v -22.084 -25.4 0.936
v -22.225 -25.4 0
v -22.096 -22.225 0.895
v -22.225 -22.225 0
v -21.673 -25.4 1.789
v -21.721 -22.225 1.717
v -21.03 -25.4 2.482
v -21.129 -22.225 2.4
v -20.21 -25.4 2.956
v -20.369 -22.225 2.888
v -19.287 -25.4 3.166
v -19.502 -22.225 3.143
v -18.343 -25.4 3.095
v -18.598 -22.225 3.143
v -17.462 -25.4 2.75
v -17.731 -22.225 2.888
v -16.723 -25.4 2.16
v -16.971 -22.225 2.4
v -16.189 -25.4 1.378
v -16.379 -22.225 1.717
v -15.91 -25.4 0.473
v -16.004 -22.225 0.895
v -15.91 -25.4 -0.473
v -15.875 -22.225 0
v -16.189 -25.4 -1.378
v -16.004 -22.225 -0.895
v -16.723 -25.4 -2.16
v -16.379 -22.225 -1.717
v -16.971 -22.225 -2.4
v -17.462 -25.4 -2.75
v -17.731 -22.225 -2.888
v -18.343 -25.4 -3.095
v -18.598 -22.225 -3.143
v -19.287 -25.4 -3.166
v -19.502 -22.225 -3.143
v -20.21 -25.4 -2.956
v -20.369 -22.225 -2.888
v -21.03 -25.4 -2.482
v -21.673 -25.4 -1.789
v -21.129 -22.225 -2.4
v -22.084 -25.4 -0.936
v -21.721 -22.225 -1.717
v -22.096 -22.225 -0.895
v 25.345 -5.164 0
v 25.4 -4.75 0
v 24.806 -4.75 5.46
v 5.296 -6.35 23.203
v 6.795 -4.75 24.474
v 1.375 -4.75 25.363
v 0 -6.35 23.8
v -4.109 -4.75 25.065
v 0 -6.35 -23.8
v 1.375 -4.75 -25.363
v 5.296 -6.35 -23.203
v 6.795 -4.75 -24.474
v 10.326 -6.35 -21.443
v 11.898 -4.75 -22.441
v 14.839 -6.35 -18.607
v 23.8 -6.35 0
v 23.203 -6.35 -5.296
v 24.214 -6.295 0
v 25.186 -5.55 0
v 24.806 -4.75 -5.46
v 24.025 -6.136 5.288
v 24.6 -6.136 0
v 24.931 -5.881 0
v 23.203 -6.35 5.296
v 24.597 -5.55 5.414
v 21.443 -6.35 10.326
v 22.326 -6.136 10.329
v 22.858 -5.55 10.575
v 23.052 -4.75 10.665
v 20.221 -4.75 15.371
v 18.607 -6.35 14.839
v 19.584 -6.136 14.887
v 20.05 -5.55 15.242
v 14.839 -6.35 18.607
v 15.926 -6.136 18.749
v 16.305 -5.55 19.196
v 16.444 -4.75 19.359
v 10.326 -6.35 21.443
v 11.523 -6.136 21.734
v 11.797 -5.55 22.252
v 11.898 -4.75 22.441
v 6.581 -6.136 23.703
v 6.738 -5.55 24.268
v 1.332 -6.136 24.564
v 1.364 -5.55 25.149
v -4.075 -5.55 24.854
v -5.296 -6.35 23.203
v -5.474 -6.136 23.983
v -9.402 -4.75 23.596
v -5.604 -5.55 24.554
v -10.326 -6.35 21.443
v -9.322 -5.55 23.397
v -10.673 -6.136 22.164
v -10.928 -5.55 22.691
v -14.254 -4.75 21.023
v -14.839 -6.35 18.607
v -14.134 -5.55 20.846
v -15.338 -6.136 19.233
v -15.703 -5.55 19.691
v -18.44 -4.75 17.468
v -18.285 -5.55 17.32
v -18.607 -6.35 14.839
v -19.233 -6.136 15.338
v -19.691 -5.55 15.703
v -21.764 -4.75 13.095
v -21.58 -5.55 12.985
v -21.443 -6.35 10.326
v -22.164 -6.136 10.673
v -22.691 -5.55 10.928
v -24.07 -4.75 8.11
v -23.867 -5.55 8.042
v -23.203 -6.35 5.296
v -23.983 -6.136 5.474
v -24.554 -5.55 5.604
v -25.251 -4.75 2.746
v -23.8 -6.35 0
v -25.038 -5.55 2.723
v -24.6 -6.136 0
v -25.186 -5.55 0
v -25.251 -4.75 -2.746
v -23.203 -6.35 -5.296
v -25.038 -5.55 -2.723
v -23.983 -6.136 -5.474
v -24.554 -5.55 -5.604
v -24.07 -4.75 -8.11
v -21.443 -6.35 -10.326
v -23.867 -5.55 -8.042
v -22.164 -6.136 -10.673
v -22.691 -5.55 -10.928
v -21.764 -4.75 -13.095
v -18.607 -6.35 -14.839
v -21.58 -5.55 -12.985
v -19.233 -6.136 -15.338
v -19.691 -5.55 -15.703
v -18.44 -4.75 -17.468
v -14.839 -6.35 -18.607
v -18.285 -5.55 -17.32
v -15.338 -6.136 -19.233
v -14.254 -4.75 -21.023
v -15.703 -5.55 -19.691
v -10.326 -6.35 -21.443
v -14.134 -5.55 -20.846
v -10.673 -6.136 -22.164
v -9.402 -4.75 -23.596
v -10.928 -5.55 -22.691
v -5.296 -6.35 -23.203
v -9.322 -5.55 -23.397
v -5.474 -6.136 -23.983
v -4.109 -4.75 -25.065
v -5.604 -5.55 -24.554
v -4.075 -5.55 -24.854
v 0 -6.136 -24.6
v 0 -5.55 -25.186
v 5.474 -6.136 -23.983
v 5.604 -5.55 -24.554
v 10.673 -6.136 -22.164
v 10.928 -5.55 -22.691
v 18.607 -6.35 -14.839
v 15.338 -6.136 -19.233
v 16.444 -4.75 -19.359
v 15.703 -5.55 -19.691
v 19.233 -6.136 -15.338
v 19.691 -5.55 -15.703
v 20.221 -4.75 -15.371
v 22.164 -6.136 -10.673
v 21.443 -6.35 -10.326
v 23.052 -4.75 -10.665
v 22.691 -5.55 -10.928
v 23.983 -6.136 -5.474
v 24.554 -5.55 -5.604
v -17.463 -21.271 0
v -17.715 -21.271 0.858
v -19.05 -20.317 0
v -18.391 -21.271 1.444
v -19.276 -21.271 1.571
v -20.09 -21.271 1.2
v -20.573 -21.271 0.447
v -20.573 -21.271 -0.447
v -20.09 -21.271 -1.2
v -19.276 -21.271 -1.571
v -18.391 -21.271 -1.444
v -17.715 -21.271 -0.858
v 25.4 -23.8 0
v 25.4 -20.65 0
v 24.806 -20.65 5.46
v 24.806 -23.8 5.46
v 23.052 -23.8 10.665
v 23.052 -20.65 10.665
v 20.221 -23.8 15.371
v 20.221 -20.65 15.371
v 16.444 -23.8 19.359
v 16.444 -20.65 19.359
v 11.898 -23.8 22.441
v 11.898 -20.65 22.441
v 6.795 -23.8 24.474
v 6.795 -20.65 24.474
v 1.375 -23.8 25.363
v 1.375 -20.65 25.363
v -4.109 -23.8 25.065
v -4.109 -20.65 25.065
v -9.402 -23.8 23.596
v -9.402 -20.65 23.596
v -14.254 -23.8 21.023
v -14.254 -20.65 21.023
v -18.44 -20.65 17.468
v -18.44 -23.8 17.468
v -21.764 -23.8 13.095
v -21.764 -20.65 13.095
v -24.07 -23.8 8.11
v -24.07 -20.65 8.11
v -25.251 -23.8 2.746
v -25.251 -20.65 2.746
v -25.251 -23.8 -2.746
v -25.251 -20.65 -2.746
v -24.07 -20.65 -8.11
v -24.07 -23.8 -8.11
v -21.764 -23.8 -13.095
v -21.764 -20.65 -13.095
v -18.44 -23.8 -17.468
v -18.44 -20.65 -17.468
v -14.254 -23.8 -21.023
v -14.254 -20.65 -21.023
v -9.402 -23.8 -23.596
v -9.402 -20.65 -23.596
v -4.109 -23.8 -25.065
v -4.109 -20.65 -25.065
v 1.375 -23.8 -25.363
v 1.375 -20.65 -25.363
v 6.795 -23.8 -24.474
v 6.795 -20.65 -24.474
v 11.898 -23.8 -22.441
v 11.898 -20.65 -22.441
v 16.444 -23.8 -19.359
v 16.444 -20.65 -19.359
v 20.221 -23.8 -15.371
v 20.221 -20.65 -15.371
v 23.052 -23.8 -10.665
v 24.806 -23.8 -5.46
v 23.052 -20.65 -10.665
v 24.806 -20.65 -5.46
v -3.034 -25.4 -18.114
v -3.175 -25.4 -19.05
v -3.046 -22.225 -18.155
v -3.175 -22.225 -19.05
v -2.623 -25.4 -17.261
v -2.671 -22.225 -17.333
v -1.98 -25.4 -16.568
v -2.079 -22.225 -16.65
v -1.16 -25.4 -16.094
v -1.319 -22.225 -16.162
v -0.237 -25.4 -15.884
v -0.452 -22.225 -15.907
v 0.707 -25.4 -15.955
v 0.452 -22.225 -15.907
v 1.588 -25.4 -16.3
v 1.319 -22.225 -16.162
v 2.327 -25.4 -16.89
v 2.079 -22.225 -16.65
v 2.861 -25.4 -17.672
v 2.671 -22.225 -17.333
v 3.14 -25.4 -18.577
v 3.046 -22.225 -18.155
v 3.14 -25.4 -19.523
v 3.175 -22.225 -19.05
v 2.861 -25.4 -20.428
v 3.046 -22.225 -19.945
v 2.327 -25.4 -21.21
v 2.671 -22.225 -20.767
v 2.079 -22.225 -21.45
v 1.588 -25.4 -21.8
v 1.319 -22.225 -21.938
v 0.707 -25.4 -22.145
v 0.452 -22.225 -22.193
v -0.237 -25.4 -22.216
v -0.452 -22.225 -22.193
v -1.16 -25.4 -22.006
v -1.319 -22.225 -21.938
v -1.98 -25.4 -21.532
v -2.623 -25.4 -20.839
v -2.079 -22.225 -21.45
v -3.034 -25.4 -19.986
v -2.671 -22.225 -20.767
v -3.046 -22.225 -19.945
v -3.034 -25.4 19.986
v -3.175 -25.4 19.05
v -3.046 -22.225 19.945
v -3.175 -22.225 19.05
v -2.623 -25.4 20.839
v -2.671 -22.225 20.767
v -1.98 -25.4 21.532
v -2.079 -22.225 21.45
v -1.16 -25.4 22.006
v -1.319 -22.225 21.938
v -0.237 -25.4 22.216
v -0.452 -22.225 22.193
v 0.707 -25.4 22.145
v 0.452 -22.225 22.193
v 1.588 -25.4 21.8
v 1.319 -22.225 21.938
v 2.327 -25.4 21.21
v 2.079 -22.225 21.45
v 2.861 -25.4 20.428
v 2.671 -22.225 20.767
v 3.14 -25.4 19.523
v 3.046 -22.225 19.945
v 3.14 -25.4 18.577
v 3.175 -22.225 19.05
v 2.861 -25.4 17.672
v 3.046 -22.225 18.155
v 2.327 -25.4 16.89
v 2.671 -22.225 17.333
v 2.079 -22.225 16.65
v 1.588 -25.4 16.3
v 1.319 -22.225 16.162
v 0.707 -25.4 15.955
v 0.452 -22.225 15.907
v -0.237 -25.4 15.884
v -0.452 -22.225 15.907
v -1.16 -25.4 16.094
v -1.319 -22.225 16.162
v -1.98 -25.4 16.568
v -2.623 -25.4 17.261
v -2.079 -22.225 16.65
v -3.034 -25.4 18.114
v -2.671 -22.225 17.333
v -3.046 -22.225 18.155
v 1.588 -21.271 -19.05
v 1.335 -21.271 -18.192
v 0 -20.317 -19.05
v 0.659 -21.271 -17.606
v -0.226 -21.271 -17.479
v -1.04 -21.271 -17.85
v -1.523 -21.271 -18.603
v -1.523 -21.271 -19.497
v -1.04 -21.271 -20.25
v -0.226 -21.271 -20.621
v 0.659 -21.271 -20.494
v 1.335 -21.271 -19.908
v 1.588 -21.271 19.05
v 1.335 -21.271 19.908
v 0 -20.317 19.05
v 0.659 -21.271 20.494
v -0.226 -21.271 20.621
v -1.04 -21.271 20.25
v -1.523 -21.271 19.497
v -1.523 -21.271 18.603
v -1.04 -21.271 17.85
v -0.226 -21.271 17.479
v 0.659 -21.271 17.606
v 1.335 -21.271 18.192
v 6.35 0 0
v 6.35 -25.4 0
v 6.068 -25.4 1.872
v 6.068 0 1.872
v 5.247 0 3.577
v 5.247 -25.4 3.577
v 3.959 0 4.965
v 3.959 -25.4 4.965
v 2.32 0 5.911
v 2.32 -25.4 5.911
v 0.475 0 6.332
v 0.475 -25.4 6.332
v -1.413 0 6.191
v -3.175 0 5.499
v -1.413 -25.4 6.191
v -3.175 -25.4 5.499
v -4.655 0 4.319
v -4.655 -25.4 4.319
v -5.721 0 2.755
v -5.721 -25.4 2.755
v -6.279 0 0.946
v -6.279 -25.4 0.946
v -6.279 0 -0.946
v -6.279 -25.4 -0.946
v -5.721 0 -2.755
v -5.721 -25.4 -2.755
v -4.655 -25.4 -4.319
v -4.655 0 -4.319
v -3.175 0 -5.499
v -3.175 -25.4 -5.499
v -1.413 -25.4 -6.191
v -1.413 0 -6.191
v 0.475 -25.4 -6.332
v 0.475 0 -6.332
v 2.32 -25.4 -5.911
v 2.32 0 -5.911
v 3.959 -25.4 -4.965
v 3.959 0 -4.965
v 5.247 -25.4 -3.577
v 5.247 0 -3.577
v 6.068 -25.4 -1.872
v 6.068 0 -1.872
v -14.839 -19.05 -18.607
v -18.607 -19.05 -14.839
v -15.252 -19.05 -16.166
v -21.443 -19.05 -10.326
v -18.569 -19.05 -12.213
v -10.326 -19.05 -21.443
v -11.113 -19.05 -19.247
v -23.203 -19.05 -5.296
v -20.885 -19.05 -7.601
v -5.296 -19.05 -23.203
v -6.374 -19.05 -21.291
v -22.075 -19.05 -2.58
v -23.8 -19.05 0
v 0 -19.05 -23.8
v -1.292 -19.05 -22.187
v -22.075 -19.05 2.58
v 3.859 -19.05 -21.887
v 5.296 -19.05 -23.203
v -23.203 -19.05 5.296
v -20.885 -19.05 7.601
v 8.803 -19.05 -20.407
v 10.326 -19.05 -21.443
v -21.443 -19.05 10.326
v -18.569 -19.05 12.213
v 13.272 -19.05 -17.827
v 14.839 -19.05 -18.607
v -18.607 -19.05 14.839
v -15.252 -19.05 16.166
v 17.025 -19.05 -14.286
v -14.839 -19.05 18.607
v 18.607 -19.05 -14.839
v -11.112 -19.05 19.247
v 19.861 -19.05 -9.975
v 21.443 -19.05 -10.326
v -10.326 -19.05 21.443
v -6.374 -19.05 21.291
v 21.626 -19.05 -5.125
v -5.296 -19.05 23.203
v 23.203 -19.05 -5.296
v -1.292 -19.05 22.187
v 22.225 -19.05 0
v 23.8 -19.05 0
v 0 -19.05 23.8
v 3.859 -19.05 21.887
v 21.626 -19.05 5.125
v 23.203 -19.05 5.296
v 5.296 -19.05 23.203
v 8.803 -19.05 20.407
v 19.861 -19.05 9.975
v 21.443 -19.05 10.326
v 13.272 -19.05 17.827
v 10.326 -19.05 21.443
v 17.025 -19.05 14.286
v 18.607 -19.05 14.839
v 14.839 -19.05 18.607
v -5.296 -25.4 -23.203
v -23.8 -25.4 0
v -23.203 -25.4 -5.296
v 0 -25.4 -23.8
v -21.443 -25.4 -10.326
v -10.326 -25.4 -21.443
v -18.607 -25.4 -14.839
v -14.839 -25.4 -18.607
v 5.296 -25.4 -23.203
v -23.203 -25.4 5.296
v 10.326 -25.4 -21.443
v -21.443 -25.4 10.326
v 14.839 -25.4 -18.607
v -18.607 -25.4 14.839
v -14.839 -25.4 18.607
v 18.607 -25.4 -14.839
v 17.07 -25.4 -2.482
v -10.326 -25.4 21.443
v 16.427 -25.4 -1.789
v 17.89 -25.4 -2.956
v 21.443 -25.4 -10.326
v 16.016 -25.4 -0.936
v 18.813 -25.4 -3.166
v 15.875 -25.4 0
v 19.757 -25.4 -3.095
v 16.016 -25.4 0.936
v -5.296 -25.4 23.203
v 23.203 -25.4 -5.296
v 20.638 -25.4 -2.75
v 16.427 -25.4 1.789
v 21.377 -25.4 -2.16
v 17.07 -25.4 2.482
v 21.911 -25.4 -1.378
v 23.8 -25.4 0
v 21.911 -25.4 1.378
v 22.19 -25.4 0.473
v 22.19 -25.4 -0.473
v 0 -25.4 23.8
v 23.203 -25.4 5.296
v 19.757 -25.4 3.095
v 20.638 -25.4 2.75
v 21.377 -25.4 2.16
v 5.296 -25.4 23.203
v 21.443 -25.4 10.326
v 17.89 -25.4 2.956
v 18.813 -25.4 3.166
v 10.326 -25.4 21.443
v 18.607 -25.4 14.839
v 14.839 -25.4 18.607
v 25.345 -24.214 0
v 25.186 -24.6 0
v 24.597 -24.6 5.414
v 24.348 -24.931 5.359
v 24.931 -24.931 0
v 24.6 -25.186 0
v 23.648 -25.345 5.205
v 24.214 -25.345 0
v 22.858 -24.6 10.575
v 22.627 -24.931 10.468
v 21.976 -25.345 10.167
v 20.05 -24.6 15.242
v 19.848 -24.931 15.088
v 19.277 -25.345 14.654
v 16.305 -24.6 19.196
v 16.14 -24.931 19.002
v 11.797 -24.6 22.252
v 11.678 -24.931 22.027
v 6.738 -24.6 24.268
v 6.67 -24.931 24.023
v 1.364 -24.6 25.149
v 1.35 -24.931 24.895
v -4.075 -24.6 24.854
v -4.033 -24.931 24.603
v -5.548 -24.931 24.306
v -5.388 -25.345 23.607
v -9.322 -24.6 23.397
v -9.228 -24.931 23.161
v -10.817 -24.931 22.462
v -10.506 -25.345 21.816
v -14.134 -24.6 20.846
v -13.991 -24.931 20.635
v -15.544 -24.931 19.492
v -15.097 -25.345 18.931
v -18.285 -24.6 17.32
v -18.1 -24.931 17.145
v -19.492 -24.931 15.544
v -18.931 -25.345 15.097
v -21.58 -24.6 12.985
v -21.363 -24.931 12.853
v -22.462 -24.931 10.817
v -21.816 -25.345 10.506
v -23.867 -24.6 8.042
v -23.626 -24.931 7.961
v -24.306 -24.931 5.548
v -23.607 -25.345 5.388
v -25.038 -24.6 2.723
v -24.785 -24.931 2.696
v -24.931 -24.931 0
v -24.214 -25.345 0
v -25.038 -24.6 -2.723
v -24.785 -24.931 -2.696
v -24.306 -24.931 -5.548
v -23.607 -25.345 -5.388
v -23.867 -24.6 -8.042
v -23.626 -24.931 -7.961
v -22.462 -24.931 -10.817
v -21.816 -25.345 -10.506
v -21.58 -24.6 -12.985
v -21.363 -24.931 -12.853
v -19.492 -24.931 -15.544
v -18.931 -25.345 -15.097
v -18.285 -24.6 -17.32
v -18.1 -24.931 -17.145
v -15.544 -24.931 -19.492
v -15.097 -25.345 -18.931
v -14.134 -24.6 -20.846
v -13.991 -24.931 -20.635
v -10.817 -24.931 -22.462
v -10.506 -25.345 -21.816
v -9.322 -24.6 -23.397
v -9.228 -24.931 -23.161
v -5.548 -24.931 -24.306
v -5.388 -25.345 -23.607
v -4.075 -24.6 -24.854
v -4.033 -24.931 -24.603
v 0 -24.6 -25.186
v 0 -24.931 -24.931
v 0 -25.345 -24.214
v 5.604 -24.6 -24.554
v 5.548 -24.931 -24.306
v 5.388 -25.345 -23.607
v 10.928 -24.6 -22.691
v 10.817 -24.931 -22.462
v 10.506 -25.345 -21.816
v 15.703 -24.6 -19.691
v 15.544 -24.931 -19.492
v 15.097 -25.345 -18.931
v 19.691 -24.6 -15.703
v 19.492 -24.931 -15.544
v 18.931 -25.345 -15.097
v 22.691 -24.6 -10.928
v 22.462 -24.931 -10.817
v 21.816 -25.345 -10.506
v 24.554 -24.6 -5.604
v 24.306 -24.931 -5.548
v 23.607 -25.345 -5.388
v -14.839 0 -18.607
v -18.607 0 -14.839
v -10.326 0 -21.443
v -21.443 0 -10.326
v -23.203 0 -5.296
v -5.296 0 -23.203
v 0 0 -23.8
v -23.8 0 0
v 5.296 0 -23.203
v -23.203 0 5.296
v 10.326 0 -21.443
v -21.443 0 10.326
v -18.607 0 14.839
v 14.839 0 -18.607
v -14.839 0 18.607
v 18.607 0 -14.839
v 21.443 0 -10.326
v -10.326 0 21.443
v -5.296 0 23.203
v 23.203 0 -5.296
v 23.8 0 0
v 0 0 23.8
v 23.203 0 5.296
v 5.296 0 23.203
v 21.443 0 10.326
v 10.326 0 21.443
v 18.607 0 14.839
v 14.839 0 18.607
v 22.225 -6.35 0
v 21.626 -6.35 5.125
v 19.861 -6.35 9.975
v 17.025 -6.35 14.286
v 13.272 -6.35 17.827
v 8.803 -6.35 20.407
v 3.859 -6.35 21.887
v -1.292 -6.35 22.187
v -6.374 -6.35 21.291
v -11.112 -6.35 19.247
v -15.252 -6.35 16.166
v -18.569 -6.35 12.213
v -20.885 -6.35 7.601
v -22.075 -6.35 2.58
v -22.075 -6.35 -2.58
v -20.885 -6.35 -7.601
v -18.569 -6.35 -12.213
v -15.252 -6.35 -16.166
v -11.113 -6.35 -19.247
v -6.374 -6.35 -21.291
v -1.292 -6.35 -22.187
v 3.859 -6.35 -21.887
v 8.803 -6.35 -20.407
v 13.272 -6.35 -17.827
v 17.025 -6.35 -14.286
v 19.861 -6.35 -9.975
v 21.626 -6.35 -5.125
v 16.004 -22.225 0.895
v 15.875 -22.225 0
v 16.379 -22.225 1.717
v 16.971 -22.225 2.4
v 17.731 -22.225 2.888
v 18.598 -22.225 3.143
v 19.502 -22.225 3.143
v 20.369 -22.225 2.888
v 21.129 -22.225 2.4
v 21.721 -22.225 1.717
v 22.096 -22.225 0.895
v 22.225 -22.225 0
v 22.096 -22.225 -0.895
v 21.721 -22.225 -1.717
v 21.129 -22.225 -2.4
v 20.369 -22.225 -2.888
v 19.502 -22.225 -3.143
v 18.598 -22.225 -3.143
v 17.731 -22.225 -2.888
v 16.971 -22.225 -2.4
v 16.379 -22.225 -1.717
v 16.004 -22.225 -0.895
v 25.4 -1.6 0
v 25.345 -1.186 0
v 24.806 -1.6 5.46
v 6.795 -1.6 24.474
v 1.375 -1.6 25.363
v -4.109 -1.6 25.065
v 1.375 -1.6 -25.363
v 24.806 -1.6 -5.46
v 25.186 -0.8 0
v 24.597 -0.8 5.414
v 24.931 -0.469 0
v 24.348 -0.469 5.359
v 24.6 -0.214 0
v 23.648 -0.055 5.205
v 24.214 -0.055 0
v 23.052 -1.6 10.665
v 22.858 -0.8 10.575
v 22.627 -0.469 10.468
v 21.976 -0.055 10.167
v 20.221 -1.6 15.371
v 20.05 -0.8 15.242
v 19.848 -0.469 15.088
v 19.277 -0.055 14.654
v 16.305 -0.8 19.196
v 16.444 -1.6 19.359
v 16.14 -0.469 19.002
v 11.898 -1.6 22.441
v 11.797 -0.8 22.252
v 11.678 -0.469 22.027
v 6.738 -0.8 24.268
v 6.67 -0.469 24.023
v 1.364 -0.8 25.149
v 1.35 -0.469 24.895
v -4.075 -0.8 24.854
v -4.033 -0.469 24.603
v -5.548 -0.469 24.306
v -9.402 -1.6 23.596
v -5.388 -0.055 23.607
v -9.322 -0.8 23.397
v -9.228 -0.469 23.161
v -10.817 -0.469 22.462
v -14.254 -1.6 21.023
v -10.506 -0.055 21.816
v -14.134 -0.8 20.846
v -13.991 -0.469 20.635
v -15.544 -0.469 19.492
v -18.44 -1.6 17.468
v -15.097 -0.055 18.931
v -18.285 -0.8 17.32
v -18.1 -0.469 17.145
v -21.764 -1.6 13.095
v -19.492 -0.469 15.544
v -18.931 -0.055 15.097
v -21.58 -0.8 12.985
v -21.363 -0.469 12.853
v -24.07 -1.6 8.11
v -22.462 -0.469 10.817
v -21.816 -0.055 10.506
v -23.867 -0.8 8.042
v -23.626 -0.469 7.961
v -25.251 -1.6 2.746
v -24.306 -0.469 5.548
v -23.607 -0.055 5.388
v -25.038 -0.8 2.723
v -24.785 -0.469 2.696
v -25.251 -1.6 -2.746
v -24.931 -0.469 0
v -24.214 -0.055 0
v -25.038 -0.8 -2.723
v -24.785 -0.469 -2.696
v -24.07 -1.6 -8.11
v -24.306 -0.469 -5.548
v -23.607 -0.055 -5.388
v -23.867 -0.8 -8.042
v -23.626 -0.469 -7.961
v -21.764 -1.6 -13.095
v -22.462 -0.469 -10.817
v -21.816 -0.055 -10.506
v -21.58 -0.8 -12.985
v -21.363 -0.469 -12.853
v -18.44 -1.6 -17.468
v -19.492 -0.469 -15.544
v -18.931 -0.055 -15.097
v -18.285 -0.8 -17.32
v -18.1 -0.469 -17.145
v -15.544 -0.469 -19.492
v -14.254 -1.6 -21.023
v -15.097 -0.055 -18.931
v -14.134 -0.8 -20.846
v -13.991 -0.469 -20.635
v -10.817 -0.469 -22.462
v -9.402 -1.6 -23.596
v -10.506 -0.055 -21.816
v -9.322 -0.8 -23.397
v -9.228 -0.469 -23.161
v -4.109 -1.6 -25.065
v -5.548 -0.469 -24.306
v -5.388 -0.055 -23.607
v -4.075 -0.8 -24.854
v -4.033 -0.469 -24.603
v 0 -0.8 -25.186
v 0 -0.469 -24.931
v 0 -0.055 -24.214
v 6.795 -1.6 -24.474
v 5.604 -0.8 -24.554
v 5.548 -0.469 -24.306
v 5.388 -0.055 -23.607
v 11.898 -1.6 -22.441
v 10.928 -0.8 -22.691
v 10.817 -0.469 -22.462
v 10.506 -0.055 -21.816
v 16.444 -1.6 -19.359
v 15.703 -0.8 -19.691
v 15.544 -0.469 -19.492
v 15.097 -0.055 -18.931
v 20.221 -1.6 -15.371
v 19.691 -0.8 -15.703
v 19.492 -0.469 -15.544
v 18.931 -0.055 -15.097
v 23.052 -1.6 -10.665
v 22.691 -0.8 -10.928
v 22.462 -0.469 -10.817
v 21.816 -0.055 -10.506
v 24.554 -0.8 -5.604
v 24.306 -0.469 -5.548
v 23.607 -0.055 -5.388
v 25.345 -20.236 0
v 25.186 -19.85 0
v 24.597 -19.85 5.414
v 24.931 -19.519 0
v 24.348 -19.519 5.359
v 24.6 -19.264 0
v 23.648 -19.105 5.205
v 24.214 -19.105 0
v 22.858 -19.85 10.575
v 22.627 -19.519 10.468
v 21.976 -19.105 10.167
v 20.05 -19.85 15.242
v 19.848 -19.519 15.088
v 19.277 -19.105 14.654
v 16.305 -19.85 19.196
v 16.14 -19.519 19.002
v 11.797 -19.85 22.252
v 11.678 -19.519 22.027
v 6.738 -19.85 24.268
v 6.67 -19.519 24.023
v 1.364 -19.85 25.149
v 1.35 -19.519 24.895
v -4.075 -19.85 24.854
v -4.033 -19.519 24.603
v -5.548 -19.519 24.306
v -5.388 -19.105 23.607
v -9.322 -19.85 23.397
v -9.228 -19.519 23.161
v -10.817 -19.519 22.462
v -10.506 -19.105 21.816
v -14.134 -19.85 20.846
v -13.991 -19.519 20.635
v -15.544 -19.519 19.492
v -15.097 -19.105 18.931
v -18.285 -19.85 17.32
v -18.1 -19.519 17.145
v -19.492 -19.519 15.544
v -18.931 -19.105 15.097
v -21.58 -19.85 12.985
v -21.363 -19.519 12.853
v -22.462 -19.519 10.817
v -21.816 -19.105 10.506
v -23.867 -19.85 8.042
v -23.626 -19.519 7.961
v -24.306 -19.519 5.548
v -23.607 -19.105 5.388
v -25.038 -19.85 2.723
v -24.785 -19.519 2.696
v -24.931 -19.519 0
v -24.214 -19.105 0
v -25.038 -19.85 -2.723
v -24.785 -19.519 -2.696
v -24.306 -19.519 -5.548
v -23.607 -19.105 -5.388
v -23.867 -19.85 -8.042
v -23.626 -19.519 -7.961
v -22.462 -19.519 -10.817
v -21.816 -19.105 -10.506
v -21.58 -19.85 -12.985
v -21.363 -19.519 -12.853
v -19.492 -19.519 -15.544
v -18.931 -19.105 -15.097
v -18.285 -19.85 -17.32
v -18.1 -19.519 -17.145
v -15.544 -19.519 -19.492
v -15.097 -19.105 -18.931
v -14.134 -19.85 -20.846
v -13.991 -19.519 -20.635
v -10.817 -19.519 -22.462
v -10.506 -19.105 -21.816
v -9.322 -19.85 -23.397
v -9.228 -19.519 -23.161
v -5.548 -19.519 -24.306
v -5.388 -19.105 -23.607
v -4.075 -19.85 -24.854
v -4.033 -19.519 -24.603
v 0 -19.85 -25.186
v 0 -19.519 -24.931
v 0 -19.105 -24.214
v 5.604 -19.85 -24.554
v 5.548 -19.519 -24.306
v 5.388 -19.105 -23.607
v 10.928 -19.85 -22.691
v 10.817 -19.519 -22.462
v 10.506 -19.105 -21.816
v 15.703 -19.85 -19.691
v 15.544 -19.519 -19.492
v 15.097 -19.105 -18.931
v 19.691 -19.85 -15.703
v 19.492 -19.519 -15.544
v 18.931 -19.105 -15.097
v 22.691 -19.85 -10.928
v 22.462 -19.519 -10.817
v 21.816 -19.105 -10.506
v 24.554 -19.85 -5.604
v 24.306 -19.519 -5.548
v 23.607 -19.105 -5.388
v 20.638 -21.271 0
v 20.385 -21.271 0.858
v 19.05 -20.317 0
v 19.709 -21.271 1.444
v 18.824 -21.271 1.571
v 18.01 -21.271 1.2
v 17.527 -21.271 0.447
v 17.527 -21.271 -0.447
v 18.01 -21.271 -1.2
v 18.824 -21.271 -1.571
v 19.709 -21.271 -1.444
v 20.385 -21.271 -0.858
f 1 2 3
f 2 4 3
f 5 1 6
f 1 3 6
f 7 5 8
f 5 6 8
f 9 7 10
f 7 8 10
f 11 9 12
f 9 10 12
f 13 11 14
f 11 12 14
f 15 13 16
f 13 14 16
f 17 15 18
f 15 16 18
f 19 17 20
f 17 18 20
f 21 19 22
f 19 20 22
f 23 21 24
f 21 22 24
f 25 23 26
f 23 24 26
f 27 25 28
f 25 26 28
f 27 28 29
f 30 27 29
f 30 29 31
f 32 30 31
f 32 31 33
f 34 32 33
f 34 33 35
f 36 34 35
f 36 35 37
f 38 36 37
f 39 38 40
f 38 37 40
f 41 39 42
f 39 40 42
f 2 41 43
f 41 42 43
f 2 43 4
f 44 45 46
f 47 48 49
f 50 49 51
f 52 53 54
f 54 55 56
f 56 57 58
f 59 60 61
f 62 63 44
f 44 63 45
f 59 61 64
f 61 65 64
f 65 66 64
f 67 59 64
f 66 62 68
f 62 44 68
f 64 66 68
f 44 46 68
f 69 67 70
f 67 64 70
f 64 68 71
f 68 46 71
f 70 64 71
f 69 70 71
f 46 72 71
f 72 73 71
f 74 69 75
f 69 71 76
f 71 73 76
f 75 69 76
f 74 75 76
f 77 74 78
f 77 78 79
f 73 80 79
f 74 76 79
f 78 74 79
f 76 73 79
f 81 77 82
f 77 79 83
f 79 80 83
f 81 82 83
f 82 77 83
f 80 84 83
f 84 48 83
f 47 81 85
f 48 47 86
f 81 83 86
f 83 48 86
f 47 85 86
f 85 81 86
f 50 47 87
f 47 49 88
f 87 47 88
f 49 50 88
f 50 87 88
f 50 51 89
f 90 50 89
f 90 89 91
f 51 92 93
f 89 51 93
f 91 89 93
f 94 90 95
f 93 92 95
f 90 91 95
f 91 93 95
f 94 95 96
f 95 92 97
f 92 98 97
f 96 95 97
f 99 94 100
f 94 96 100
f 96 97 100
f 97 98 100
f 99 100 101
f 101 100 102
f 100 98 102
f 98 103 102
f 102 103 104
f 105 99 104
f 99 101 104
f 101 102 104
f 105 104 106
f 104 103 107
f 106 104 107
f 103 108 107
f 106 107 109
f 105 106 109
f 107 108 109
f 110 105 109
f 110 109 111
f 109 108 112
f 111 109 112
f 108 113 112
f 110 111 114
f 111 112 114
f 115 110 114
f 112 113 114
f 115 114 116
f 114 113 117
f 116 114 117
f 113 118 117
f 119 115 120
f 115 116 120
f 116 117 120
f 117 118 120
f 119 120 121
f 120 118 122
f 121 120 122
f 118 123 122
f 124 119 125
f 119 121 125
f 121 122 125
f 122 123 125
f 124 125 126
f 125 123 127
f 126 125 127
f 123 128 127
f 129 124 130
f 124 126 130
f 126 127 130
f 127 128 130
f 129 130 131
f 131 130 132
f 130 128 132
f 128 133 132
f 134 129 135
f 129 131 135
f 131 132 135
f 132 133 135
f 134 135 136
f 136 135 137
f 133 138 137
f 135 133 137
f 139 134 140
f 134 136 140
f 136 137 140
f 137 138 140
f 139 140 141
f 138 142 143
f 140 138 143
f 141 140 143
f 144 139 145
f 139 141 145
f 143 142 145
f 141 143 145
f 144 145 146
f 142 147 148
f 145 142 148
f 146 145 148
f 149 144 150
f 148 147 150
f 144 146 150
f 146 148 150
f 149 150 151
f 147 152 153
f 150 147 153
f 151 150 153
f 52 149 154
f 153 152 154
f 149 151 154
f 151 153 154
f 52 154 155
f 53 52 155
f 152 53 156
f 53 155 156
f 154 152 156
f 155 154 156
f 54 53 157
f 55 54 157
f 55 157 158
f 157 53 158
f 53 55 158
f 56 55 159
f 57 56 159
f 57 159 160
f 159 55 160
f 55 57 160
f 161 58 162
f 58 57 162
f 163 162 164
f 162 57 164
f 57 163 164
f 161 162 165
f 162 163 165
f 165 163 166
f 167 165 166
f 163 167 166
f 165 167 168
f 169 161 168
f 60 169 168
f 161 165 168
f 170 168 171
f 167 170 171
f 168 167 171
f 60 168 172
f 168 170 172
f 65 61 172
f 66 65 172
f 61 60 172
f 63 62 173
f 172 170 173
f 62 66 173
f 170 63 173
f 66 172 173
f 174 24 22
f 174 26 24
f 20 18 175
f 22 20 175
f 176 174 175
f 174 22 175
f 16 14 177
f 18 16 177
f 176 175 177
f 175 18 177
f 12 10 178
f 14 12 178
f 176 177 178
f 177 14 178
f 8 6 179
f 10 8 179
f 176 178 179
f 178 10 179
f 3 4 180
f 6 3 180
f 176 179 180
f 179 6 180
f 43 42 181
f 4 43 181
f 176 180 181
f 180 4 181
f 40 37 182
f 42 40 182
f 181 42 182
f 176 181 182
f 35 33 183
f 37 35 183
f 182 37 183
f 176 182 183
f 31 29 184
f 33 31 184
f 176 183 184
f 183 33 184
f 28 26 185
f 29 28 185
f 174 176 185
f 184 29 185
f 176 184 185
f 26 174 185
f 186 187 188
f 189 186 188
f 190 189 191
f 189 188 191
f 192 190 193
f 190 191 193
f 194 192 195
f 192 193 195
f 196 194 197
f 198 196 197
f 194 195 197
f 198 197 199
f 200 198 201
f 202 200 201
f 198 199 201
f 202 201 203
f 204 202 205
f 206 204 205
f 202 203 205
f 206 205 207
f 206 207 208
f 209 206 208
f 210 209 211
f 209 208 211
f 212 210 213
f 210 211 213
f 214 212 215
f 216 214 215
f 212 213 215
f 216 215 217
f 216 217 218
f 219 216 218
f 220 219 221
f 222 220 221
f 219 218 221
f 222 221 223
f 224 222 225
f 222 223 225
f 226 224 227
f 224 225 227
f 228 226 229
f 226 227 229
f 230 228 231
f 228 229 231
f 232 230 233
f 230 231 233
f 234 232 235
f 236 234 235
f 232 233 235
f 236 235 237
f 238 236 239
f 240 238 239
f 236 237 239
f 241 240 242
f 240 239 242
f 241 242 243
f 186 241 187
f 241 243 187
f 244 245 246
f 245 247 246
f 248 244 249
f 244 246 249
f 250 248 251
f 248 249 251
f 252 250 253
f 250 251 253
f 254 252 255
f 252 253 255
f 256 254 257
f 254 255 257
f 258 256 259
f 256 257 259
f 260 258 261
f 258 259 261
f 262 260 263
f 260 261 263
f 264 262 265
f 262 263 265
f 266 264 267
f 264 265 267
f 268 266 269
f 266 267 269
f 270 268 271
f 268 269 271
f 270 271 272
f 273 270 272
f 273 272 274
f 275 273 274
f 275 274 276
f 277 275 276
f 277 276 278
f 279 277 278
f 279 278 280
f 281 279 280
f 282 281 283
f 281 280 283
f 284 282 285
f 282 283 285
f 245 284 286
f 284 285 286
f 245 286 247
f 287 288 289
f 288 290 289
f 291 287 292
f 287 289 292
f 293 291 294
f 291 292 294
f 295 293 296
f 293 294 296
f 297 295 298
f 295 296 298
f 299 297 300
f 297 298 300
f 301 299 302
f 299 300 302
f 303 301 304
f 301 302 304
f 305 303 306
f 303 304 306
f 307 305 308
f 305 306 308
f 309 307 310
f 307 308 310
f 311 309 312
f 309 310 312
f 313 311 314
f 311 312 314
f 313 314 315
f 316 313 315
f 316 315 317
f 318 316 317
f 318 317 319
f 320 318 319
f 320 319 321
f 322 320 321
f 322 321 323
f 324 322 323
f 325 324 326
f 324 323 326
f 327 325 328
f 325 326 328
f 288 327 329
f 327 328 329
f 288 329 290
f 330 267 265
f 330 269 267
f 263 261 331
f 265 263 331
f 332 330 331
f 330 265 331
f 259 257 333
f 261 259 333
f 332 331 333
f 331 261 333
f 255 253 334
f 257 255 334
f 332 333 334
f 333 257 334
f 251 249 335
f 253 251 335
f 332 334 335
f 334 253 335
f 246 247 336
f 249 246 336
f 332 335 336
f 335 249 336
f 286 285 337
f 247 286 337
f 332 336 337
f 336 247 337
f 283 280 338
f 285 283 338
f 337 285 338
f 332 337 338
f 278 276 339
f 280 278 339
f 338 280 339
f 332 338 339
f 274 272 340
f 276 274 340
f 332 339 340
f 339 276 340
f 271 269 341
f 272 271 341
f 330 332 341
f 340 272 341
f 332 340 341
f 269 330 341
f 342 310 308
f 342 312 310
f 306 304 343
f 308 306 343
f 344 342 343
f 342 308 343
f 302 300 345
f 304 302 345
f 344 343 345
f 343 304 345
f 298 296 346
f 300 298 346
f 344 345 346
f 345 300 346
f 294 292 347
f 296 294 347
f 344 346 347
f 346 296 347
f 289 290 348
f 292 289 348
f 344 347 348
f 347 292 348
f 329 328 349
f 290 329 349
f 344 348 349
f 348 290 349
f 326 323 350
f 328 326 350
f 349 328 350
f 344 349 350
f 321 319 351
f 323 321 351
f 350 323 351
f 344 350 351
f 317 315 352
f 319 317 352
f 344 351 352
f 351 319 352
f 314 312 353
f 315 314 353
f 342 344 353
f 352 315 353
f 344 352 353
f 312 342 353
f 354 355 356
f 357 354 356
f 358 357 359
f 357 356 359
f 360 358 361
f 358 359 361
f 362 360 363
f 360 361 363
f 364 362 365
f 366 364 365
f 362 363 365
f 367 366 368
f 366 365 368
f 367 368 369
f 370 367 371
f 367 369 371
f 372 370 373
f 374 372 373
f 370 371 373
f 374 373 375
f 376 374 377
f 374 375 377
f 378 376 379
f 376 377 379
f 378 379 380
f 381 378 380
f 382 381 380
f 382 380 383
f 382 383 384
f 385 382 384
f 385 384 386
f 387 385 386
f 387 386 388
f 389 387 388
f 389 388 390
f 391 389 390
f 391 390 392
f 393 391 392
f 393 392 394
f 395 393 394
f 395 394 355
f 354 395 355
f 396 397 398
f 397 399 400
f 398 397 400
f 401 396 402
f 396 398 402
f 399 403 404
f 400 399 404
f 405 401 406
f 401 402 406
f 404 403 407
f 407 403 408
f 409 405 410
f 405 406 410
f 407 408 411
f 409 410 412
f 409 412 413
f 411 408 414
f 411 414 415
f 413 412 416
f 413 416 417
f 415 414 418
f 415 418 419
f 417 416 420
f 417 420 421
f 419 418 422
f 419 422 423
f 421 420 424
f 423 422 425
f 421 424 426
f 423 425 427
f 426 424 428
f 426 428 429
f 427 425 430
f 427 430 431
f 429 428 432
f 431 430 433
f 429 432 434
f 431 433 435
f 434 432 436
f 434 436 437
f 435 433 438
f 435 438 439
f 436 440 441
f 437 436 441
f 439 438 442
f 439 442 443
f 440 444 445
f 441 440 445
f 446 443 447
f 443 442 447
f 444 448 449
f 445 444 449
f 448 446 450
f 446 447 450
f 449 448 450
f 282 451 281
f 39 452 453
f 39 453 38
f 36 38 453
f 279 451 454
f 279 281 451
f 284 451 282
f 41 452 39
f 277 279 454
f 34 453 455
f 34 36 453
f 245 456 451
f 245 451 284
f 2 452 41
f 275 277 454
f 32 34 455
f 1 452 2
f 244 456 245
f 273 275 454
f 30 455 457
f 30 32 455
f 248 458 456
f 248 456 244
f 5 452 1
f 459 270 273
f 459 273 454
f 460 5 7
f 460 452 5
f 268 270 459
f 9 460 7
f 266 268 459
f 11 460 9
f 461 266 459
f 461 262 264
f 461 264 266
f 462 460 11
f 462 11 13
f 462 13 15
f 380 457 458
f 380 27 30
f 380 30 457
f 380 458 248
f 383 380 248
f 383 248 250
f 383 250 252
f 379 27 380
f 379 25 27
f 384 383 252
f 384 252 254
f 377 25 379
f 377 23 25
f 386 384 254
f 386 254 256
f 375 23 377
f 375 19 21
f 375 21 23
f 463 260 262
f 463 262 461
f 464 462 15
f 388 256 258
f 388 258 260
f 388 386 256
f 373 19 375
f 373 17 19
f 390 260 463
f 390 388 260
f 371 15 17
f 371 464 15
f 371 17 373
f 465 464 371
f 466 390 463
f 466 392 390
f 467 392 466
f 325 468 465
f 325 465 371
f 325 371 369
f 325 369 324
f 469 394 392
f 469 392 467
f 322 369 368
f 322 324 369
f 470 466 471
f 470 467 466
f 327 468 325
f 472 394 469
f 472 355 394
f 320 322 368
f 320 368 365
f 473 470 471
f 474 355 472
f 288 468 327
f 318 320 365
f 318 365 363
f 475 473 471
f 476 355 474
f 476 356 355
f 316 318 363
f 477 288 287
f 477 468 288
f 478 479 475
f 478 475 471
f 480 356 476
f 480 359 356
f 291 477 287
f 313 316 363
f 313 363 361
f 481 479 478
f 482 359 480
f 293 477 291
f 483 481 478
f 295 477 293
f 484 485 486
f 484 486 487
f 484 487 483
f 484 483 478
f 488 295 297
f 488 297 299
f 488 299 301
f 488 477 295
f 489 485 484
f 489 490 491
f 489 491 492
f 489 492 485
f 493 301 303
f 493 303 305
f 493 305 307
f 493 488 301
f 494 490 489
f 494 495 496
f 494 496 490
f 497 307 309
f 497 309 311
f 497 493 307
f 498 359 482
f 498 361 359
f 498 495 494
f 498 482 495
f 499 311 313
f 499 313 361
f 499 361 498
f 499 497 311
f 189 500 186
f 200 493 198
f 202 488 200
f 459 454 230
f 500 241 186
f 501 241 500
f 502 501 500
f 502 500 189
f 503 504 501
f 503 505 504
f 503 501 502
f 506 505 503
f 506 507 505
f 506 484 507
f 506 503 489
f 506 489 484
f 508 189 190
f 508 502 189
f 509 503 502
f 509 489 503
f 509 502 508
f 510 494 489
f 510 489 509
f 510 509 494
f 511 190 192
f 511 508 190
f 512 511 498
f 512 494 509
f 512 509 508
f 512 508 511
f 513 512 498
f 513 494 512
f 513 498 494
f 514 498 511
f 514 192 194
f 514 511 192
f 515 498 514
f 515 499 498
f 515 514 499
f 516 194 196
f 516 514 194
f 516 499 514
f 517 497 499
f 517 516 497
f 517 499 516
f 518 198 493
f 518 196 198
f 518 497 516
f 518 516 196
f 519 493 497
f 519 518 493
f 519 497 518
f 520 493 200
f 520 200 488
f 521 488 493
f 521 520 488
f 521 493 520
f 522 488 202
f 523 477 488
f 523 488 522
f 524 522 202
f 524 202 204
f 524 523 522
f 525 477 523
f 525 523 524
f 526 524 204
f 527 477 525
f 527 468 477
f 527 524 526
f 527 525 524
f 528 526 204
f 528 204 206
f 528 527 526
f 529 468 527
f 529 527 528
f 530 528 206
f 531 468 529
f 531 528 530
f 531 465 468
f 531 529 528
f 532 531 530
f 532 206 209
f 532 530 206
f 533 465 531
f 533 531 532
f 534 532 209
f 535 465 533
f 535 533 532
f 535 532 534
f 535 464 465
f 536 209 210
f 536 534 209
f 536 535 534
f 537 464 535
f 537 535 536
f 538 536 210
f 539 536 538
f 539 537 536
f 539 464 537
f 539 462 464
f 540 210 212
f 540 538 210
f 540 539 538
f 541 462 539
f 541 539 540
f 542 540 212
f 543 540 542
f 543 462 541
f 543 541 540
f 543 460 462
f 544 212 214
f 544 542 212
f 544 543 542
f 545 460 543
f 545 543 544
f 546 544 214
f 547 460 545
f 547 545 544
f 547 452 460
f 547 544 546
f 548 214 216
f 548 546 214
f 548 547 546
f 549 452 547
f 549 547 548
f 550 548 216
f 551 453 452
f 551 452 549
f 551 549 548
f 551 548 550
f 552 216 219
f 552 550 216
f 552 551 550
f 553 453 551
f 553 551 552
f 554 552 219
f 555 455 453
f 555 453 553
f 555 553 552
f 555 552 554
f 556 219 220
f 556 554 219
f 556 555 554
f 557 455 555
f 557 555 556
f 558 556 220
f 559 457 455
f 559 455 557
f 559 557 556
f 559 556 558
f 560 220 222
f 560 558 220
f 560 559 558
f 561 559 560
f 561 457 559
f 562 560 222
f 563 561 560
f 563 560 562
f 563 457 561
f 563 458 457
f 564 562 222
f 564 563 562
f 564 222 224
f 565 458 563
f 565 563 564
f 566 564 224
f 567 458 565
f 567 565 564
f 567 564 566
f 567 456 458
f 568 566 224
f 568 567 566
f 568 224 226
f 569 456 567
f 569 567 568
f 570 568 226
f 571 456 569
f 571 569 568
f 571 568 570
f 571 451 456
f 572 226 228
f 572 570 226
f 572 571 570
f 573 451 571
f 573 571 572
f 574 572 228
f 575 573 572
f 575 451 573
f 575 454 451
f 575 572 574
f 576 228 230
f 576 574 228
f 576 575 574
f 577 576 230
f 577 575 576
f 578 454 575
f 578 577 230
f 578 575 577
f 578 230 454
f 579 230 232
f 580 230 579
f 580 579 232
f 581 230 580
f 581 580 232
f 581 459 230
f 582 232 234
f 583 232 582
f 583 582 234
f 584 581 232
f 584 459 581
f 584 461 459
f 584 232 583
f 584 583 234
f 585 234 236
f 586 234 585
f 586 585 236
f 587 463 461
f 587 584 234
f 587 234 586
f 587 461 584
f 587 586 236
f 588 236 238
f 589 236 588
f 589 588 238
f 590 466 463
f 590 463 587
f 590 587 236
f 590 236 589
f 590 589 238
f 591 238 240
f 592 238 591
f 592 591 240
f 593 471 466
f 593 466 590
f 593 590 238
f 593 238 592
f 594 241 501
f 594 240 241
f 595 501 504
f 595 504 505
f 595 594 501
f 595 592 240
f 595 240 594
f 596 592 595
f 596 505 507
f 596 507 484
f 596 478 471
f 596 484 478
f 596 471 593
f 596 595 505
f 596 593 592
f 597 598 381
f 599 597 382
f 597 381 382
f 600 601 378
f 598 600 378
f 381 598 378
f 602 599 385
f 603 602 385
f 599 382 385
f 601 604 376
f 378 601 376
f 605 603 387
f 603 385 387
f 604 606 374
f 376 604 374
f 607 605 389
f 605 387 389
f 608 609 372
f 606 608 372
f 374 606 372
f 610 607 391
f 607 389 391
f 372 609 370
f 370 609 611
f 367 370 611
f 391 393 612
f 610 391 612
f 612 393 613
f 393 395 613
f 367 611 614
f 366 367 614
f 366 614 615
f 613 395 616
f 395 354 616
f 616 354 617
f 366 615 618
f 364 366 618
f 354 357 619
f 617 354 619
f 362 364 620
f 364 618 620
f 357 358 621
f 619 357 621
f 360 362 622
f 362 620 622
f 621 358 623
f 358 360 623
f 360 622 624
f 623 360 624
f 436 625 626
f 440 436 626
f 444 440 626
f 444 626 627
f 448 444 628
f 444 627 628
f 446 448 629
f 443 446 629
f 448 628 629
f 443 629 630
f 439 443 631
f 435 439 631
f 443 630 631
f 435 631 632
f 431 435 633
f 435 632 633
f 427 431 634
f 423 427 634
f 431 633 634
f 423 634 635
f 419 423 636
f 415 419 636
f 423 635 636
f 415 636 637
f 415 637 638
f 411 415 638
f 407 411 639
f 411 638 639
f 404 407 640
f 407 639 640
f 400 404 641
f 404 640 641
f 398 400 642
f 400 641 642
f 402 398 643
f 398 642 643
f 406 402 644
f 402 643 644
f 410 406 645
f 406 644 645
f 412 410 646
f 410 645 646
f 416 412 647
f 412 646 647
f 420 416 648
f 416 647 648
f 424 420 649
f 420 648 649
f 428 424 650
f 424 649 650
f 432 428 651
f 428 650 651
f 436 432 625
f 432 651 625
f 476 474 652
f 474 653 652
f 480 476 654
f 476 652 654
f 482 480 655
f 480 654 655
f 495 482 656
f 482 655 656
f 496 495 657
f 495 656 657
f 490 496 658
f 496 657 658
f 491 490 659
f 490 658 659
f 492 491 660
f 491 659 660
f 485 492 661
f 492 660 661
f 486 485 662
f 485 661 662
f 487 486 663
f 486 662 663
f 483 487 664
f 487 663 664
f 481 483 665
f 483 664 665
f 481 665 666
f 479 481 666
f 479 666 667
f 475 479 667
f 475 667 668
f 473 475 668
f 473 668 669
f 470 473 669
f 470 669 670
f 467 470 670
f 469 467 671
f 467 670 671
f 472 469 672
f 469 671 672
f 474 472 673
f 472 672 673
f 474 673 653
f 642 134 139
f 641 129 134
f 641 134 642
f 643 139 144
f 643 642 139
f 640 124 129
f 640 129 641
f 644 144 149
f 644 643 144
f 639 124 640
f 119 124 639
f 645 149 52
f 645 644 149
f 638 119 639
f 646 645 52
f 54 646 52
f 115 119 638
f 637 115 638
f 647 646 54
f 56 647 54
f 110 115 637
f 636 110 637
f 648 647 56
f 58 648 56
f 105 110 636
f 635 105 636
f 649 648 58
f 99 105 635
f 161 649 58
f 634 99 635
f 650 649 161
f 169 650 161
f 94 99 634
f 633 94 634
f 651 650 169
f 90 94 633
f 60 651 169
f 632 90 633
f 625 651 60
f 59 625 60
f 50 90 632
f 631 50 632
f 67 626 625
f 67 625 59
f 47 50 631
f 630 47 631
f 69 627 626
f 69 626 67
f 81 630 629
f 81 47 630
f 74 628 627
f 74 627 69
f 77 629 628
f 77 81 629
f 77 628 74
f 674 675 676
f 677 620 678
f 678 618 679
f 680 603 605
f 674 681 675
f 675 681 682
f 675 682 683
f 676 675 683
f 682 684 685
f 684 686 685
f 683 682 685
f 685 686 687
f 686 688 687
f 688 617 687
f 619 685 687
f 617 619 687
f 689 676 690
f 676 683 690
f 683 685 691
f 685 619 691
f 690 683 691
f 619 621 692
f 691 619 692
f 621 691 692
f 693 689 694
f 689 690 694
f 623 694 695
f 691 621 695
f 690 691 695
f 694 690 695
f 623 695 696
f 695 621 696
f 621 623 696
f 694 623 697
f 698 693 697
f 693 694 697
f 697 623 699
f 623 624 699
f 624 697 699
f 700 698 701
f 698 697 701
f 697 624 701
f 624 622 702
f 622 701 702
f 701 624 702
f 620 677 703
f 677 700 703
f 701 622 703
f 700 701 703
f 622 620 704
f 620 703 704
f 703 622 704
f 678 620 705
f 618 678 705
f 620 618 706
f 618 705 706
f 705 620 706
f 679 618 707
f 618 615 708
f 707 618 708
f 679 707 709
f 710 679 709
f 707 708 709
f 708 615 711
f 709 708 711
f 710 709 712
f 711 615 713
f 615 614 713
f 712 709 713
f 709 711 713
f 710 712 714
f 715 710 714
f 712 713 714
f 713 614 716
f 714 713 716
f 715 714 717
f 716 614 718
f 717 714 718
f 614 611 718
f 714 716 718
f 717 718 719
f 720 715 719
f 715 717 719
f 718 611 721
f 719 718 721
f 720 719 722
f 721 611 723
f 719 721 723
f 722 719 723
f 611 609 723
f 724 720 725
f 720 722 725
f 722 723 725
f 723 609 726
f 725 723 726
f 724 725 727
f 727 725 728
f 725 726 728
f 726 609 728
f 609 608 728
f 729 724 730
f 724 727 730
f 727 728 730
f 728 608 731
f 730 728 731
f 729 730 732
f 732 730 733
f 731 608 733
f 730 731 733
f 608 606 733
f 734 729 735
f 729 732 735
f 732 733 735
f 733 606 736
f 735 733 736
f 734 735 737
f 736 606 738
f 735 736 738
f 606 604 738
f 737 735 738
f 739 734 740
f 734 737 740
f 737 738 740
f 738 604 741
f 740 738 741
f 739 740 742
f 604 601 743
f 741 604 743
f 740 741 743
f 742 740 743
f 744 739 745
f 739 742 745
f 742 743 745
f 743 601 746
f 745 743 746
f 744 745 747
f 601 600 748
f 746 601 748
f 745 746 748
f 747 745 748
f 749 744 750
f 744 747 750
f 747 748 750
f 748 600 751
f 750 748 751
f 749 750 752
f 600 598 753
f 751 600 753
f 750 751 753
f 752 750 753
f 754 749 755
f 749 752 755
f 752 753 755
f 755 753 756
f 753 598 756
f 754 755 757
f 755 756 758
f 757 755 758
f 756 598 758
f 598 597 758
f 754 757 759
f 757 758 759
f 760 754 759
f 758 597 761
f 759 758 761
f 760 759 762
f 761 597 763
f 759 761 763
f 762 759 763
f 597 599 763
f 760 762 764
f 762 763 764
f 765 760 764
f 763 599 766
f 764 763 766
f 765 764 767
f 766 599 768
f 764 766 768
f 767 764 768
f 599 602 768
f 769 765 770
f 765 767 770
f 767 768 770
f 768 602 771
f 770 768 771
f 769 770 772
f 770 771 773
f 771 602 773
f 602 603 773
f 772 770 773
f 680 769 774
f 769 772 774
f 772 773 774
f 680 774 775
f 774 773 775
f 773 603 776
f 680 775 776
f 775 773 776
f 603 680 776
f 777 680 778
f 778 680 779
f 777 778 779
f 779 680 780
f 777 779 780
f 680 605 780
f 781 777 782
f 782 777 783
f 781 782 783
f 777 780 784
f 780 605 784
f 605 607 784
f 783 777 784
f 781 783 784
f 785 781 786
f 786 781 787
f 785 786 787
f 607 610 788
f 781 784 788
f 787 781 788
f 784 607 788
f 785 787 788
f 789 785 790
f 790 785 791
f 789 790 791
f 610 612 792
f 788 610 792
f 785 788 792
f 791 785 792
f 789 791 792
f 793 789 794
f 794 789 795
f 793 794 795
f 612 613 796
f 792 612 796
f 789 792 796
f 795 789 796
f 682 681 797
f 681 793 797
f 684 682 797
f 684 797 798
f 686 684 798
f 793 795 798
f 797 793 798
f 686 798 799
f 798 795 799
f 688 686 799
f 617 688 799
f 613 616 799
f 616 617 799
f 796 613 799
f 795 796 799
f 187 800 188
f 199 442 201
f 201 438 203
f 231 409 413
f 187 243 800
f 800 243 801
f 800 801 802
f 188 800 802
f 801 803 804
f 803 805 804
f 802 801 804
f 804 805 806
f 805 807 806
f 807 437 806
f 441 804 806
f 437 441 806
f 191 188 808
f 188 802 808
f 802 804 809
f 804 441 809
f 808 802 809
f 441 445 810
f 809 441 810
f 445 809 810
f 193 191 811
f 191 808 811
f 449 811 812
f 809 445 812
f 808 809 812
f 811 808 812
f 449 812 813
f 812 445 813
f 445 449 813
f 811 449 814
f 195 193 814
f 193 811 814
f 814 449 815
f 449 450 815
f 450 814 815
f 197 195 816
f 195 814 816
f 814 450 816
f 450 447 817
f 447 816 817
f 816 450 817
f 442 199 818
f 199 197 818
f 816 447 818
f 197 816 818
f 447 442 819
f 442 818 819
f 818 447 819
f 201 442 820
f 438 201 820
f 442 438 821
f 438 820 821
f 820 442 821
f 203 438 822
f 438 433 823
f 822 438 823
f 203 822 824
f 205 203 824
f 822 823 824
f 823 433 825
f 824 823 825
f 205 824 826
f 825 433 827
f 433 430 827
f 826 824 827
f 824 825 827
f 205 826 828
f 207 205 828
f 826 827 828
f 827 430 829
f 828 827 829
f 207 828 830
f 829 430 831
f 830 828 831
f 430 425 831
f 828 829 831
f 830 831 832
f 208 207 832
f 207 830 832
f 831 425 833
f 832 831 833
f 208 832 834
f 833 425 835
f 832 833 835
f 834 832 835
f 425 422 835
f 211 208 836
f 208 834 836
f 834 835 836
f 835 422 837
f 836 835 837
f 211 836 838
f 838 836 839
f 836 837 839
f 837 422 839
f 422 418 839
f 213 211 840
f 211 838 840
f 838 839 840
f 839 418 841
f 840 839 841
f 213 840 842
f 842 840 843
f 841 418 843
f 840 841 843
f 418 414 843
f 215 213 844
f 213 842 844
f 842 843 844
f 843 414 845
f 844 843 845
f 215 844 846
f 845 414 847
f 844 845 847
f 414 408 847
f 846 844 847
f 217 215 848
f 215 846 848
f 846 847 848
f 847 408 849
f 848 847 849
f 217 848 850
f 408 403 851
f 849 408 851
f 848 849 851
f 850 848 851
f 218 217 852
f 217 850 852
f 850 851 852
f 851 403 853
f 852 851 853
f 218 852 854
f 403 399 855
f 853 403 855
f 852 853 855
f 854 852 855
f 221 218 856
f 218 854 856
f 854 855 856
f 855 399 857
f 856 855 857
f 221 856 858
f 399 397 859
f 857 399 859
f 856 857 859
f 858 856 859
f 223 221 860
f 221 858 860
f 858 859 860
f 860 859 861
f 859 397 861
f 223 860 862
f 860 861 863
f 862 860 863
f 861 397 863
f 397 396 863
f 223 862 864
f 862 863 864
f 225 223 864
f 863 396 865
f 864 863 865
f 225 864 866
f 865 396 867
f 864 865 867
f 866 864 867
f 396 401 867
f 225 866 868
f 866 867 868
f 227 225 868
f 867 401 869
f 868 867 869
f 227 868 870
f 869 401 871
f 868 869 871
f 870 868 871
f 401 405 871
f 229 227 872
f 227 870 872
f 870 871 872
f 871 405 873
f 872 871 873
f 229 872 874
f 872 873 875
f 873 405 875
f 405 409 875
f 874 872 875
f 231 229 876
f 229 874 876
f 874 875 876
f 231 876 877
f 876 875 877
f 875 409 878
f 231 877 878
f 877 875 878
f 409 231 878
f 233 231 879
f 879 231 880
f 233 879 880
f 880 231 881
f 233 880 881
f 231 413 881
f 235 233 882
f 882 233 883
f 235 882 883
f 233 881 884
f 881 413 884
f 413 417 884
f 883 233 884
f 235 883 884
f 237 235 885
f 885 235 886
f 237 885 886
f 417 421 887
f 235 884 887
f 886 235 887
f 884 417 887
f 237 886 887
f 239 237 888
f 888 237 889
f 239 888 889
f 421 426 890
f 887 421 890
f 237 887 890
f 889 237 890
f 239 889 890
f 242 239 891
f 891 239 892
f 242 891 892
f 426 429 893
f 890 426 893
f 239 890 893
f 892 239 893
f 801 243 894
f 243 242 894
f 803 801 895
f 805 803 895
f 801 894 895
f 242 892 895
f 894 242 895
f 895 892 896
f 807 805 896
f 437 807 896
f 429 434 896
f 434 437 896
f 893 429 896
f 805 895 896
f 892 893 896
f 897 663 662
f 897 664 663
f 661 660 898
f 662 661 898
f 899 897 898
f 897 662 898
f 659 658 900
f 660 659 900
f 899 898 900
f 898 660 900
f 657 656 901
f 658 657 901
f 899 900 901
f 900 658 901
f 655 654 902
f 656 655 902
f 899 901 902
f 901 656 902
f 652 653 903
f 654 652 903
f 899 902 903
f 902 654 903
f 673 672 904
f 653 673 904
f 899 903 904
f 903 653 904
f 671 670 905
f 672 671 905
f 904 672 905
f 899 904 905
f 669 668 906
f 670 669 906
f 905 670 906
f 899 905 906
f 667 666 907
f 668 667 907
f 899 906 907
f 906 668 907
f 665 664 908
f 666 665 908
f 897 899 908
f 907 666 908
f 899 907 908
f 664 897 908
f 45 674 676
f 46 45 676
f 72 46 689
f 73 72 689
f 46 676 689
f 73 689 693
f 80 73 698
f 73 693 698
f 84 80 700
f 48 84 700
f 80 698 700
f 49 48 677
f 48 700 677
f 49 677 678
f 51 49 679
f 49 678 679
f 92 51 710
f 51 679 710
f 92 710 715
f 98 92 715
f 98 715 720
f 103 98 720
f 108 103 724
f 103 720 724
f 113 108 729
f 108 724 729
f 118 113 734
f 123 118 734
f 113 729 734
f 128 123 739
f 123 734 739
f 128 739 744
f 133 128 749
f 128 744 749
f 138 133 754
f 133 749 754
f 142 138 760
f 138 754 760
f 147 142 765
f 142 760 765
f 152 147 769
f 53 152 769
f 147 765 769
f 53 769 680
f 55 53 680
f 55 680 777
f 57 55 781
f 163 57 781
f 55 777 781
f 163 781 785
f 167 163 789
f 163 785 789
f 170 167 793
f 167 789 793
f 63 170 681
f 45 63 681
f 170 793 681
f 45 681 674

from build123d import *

# Parameters (mm, degrees)
F0_R      = 25.4
F1_DEPTH  = 6.35
F2_R      = 22.225
F3_DEPTH  = 12.7
F4_R      = 25.4
F5_DEPTH  = 6.35
F7_D      = 6.35
F7_DEPTH  = 3.175
F7_TIP    = 1.9077324654
F8_R      = 1.6002
F9_R      = 6.35
F10_DEPTH = 25.401


with BuildPart() as f1:
    # F0 (on Front) → F1 (new body)
    with BuildSketch(Plane.XZ):
        Circle(F0_R)
    extrude(amount=F1_DEPTH)

    # F2 (on face) → F3 (join)
    with BuildSketch(Plane.XZ.offset(6.35)):
        Circle(F2_R)
    extrude(amount=F3_DEPTH)

    # F4 (on face) → F5 (join)
    with BuildSketch(Plane.XZ.offset(19.05)):
        Circle(F4_R)
    extrude(amount=F5_DEPTH)

    # F7
    with Locations(Plane.XZ.offset(25.4)):
        with Locations((0, 19.05), (19.05, 0), (0, -19.05), (-19.05, 0)):
            Hole(F7_D / 2, depth=F7_DEPTH)
            with Locations((0, 0, -(F7_DEPTH + F7_TIP / 2))):  # 118° drill point
                Cone(0, F7_D / 2, F7_TIP, mode=Mode.SUBTRACT)

    # F8
    f8_edges = [f1.edges().sort_by_distance(p)[0] for p in [
        (-25.4, -25.4, 0),
        (-25.4, -19.05, 0),
        (-25.4, -6.35, 0),
        (-25.4, 0, 0),
    ]]
    fillet(f8_edges, radius=F8_R)

    # F9 (on face) → F10 (cut, through all)
    with BuildSketch(Plane.XZ.offset(25.4)):
        Circle(F9_R)
    extrude(amount=-F10_DEPTH, mode=Mode.SUBTRACT)


solid = f1.part
